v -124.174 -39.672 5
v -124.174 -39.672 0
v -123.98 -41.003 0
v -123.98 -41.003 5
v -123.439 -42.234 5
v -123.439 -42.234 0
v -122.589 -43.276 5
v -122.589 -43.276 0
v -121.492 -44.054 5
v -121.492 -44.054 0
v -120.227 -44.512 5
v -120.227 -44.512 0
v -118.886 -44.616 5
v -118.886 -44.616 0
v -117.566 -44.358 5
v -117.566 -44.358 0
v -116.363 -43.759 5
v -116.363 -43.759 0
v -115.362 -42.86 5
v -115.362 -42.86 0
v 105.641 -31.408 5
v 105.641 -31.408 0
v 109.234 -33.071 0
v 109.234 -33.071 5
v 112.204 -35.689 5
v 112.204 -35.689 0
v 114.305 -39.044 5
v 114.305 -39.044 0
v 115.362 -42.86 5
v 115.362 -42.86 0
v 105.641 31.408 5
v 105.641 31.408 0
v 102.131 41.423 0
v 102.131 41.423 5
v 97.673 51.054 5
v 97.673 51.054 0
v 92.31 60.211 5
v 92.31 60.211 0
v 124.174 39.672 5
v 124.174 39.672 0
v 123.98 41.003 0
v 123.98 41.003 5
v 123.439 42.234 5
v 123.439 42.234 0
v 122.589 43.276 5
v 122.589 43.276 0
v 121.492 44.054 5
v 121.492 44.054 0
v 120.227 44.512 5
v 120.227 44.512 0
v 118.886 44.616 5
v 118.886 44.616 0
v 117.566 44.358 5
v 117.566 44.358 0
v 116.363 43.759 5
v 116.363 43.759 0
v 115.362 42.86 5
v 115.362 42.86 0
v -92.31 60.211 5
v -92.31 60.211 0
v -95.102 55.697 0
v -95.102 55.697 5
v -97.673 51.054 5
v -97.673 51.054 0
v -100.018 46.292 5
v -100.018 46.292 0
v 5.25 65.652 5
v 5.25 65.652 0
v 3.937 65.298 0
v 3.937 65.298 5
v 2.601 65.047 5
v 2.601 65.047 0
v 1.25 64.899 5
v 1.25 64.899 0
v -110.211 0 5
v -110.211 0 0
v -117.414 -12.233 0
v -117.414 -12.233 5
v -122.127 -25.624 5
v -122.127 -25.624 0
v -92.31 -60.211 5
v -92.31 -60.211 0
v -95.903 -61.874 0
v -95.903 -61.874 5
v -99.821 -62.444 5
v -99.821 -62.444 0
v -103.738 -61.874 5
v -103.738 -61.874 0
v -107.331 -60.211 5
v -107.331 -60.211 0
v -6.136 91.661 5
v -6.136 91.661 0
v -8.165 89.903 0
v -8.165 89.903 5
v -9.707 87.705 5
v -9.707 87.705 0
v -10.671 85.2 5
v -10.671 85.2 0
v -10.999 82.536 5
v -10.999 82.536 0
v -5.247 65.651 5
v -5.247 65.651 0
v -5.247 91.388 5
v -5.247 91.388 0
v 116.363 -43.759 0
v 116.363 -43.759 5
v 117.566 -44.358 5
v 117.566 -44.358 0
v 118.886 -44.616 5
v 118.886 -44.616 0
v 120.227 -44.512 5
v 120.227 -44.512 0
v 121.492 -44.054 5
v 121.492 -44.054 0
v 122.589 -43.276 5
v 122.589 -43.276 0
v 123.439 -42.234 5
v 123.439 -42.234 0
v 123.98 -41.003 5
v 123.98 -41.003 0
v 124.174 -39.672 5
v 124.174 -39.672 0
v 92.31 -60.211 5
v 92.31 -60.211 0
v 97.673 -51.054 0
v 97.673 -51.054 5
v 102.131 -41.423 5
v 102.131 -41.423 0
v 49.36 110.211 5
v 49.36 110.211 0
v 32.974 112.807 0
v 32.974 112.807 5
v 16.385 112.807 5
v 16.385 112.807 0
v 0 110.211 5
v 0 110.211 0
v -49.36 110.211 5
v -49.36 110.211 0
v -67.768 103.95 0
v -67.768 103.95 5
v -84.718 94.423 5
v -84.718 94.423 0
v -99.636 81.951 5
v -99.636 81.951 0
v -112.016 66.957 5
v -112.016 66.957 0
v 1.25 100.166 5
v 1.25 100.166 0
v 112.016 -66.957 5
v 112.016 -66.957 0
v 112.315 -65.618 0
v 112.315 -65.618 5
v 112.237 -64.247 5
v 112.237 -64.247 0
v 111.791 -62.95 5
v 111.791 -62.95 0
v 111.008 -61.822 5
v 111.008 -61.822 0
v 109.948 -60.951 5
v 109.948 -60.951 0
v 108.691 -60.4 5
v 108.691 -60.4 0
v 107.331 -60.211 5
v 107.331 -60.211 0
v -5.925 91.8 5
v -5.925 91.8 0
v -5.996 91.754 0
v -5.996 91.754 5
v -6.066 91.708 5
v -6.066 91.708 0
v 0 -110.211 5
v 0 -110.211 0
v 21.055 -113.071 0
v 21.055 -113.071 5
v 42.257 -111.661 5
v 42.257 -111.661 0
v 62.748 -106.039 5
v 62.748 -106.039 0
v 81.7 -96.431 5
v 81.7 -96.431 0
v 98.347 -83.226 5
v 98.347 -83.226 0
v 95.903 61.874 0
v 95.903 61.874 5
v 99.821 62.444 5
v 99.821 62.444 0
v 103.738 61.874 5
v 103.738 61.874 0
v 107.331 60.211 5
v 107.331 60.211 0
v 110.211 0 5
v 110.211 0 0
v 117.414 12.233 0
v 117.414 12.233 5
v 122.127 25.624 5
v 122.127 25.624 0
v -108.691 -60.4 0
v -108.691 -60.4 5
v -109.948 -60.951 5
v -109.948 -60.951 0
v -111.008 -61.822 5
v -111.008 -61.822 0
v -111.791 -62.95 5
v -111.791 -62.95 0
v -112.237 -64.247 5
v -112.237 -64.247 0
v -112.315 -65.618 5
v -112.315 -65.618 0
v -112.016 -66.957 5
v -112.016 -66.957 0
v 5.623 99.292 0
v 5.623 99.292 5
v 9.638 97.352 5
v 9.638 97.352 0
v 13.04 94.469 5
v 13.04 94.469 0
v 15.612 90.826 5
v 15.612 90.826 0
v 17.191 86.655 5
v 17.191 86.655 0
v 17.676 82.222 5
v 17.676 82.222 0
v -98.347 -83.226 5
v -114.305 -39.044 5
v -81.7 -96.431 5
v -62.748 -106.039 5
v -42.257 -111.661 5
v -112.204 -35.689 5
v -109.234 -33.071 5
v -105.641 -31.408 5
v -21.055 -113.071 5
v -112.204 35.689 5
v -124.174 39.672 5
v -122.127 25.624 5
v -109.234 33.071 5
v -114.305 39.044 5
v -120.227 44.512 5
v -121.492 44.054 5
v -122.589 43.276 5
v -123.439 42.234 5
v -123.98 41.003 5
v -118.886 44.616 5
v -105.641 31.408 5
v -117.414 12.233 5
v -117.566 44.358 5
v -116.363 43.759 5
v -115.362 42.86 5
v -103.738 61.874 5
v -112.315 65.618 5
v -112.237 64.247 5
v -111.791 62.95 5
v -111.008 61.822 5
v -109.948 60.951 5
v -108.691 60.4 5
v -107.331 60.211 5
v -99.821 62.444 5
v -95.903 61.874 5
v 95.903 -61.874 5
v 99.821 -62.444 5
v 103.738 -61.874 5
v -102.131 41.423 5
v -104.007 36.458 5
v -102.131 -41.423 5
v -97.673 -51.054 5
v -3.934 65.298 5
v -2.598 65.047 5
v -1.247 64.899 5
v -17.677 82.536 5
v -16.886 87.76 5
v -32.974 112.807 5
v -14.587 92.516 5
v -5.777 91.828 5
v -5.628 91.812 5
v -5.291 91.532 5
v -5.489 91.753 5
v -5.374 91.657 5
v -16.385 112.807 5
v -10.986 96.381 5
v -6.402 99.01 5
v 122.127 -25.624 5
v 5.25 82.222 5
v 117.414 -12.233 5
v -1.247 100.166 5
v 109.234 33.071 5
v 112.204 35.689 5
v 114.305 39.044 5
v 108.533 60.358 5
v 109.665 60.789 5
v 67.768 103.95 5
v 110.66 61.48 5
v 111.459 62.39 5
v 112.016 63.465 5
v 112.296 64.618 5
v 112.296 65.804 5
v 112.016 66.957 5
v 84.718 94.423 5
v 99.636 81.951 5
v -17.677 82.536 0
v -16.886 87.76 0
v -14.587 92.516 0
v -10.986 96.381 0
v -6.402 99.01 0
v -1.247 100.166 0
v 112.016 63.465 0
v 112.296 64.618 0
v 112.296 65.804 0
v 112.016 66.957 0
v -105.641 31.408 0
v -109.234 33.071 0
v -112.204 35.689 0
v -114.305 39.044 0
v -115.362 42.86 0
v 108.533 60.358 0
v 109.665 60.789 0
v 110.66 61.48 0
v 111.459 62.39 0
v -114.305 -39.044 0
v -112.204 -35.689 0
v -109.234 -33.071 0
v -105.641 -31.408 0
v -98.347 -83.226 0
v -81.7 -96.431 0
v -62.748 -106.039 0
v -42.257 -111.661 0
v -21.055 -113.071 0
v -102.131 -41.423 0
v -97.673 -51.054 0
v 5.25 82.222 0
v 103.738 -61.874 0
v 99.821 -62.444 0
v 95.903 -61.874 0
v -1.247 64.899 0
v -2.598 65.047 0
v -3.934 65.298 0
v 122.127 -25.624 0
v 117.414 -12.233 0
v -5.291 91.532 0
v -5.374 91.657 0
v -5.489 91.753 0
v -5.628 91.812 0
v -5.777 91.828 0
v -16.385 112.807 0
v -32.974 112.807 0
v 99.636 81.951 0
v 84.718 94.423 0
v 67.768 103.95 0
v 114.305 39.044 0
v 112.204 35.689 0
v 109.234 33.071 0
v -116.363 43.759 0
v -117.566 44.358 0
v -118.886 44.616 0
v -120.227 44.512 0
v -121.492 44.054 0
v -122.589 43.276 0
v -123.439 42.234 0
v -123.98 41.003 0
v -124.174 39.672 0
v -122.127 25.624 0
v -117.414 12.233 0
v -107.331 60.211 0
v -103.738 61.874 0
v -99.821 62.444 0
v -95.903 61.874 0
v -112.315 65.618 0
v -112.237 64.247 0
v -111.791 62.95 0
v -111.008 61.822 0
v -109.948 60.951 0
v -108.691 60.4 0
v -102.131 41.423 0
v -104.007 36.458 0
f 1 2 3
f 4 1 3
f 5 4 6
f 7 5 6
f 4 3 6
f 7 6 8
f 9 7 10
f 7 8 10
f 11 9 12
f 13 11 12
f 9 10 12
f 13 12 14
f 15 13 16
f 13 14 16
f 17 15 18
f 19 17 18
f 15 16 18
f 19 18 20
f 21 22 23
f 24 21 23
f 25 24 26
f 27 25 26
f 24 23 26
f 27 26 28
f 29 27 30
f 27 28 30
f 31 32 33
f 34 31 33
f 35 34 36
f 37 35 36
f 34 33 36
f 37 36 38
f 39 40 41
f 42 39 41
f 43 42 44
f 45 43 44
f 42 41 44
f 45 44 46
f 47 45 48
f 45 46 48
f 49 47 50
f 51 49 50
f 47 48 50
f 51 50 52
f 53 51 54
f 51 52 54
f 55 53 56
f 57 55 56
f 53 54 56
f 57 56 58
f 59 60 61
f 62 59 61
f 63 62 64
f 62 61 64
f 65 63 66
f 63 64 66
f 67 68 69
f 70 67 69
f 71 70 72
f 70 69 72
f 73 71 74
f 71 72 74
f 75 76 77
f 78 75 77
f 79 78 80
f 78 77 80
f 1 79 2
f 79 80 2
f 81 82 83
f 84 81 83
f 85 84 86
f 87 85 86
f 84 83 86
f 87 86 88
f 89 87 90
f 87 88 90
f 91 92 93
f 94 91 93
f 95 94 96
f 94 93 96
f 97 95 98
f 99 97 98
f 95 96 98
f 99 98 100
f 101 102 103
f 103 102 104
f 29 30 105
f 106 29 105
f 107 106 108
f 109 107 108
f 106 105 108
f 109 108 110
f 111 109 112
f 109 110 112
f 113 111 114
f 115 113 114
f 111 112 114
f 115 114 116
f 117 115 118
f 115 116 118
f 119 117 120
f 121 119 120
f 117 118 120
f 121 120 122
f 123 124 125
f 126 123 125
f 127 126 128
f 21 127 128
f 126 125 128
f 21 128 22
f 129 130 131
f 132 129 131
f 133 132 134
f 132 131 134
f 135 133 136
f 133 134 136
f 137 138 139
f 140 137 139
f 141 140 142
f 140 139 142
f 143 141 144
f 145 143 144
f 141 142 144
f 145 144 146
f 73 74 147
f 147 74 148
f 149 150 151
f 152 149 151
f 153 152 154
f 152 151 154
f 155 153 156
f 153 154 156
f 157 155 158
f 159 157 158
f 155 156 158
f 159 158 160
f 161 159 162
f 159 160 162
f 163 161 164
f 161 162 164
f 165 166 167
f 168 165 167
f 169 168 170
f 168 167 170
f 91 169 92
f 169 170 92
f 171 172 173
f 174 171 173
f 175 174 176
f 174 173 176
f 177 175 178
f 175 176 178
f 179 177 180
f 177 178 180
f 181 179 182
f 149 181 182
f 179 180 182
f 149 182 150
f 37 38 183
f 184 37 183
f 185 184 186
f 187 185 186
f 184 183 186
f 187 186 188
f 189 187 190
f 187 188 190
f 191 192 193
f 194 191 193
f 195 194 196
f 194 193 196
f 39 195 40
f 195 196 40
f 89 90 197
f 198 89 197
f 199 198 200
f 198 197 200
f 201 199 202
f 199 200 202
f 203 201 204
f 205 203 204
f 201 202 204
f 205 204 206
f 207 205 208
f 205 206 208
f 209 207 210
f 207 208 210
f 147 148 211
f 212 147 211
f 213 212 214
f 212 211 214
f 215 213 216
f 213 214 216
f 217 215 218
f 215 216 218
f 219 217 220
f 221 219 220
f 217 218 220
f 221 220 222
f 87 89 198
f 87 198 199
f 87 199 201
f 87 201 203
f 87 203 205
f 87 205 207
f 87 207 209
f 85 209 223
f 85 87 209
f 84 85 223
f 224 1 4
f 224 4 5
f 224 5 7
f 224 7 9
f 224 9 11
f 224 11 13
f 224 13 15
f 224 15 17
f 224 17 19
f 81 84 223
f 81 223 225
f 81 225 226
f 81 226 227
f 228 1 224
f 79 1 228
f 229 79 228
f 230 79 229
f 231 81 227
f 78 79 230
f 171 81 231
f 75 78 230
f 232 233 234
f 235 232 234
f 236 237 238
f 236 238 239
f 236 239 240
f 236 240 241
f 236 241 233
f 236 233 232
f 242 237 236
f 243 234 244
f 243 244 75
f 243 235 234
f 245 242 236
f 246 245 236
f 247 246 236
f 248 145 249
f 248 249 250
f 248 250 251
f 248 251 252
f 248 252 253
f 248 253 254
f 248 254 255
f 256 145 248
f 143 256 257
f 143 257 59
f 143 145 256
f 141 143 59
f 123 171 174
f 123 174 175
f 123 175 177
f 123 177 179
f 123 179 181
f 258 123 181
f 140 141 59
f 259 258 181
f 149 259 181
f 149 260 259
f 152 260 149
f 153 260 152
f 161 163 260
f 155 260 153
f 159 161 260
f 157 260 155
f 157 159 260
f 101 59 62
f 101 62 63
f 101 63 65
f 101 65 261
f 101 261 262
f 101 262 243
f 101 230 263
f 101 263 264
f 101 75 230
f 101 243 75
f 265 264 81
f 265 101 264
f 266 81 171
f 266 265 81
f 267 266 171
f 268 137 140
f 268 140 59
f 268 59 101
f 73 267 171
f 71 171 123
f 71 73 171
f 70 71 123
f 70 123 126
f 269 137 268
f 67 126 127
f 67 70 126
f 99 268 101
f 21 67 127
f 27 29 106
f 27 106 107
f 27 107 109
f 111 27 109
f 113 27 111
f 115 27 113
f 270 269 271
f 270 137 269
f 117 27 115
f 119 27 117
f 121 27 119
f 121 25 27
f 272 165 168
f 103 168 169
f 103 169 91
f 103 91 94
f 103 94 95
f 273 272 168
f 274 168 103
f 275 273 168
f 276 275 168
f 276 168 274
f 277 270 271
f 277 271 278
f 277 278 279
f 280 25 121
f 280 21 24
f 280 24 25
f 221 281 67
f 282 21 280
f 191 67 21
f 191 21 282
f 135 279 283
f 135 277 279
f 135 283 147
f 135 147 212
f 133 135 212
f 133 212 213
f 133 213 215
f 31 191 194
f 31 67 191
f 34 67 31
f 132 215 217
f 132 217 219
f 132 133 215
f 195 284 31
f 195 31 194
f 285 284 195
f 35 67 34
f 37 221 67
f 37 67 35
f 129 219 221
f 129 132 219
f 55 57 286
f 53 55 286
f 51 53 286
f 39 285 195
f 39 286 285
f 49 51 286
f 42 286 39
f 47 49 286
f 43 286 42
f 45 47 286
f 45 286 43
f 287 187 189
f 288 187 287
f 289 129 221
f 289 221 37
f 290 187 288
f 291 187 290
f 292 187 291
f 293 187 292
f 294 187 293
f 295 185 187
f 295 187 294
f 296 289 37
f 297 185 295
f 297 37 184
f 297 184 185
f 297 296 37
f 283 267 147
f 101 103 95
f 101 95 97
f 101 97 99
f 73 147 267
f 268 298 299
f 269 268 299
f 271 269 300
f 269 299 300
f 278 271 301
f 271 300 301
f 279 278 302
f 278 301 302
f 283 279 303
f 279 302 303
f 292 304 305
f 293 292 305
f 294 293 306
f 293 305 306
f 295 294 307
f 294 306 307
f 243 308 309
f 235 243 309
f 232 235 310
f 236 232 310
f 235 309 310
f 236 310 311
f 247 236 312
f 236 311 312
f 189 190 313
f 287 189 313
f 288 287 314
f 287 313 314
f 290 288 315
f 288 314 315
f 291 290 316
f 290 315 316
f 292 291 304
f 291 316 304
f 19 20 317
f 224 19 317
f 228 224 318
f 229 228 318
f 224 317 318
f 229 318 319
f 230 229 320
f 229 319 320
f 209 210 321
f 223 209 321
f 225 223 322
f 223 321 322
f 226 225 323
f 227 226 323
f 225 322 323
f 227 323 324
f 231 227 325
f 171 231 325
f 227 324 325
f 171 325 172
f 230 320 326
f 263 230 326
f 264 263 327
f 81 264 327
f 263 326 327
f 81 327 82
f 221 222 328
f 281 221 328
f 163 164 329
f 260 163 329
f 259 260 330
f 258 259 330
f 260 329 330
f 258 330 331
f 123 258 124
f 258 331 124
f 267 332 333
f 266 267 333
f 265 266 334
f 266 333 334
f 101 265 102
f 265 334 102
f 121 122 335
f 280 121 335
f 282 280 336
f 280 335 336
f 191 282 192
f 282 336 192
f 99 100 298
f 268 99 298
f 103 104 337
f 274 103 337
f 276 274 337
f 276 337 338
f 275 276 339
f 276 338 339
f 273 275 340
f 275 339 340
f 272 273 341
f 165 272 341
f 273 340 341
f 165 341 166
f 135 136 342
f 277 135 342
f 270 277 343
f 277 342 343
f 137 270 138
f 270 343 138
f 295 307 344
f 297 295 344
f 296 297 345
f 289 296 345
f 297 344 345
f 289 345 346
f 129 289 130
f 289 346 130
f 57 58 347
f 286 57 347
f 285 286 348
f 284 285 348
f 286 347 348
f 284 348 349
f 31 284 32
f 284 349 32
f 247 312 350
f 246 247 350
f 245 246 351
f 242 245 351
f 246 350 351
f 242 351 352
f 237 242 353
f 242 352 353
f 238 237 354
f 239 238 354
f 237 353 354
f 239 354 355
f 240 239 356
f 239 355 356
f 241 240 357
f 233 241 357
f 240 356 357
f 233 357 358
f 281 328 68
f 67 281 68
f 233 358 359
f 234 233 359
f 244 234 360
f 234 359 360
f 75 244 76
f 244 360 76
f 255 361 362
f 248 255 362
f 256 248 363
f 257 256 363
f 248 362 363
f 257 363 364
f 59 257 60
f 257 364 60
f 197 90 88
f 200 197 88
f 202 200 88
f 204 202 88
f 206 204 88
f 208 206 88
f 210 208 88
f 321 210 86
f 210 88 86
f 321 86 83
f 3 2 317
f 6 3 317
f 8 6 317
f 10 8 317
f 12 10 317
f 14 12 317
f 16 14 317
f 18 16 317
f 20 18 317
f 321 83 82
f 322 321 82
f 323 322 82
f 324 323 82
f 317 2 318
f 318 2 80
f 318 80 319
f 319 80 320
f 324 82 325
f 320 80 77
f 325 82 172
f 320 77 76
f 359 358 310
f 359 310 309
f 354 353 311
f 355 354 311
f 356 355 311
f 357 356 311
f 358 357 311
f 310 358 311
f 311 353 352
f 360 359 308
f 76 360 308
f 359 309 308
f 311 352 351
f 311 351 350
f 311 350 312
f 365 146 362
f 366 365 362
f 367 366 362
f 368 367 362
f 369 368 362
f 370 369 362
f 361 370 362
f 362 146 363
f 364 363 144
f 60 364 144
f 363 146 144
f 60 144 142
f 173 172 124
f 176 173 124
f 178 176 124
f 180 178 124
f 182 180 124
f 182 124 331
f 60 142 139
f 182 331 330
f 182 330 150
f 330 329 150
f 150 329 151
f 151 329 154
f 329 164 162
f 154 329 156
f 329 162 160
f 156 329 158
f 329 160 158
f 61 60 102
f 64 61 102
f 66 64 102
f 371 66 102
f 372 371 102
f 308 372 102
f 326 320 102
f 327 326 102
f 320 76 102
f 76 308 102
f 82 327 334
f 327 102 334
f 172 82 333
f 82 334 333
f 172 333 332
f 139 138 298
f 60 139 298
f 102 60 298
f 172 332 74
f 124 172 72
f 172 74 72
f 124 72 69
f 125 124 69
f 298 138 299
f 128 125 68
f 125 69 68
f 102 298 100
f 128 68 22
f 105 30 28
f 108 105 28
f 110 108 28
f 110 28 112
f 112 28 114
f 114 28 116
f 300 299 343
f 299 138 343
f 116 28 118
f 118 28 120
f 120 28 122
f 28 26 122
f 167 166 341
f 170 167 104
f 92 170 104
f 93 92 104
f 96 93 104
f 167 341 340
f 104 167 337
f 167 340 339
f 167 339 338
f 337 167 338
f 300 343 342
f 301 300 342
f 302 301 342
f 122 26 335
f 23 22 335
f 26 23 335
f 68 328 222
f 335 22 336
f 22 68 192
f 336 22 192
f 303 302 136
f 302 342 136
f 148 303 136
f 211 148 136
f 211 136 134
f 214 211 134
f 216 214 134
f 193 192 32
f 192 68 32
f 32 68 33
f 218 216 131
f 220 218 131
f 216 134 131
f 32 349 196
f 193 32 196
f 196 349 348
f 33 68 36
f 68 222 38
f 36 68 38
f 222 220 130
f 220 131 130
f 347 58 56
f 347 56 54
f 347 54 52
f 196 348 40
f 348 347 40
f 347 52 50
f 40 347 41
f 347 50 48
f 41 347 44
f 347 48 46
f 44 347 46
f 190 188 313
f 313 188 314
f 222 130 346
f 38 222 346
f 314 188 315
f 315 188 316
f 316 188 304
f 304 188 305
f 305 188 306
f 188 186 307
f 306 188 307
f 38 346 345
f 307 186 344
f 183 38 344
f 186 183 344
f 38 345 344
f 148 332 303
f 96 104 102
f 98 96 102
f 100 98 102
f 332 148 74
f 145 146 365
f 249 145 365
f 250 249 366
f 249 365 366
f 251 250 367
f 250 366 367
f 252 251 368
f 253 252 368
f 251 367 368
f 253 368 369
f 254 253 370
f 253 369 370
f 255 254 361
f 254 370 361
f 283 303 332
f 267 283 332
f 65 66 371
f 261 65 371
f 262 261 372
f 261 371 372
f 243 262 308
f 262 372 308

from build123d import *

# Parameters (mm, degrees)
F1_DEPTH = 5


with BuildPart() as f1:
    # F0 (on Top) → F1 (new body)
    with BuildSketch(Plane.XY):
        with BuildLine():
            ThreePointArc((-49.3595098916, 110.2112788137), (-84.71847747, 94.422814407), (-112.0164757766, 66.9573545531))
            ThreePointArc((-112.0164757766, 66.9573545531), (-111.4379878132, 62.359119868), (-107.33126292, 60.2112788137))
            ThreePointArc((-107.33126292, 60.2112788137), (-99.8206092018, 62.444259798), (-92.3099554835, 60.2112788137))
            Line((-92.3099554835, 60.2112788137), (0, 0))
            Line((0, 0), (-110.2112788137, 0))
            ThreePointArc((-110.2112788137, 0), (-109.0627736394, -15.869385112), (-105.6411951245, -31.4080223893))
            ThreePointArc((-105.6411951245, -31.4080223893), (-100.0178554155, -46.292057373), (-92.3099554835, -60.2112788137))
            ThreePointArc((-92.3099554835, -60.2112788137), (-99.8206092018, -62.444259798), (-107.33126292, -60.2112788137))
            ThreePointArc((-107.33126292, -60.2112788137), (-111.4379878132, -62.359119868), (-112.0164757766, -66.9573545531))
            ThreePointArc((-112.0164757766, -66.9573545531), (-62.7481057699, -106.0388311627), (0, -110.2112788137))
            ThreePointArc((0, -110.2112788137), (62.7481057699, -106.0388311627), (112.0164757766, -66.9573545531))
            ThreePointArc((112.0164757766, -66.9573545531), (111.4379878132, -62.359119868), (107.33126292, -60.2112788137))
            ThreePointArc((107.33126292, -60.2112788137), (99.8206092018, -62.444259798), (92.3099554835, -60.2112788137))
            ThreePointArc((92.3099554835, -60.2112788137), (100.0178554155, -46.292057373), (105.6411951245, -31.4080223893))
            ThreePointArc((105.6411951245, -31.4080223893), (109.0627736394, -15.869385112), (110.2112788137, 0))
            ThreePointArc((110.2112788137, 0), (109.0627736394, 15.869385112), (105.6411951245, 31.4080223893))
            ThreePointArc((105.6411951245, 31.4080223893), (100.0178554155, 46.292057373), (92.3099554835, 60.2112788137))
            ThreePointArc((92.3099554835, 60.2112788137), (99.8206092018, 62.444259798), (107.33126292, 60.2112788137))
            ThreePointArc((107.33126292, 60.2112788137), (110.1834218657, 61.1045539205), (112.0164757766, 63.4652030743))
            Line((112.0164757766, 63.4652030743), (112.0164757766, 66.9573545531))
            ThreePointArc((112.0164757766, 66.9573545531), (84.71847747, 94.422814407), (49.3595098916, 110.2112788137))
            Line((49.3595098916, 110.2112788137), (0, 110.2112788137))
            Line((0, 110.2112788137), (-49.3595098916, 110.2112788137))
        make_face()
        with BuildLine():
            ThreePointArc((-17.676910541, 82.5358693145), (-12.9316790716, 94.5842825427), (-1.2471505461, 100.165794538))
            Line((-1.2471505461, 100.165794538), (-1.2471505461, 82.5358693145))
            Line((-1.2471505461, 82.5358693145), (-1.2471505461, 65.0322264722))
            Line((-1.2471505461, 65.0322264722), (-1.2471505461, 64.8986584064))
            ThreePointArc((-1.2471505461, 64.8986584064), (-3.2688897914, 65.1595640594), (-5.2471505461, 65.6514845023))
            Line((-5.2471505461, 65.6514845023), (-5.2471505461, 91.2374200697))
            Line((-5.2471505461, 91.2374200697), (-5.2471505461, 91.3882628083))
            ThreePointArc((-5.2471505461, 91.3882628083), (-5.4893133361, 91.7531337591), (-5.9247359984, 91.7998320749))
            ThreePointArc((-5.9247359984, 91.7998320749), (-6.030968486, 91.7310453203), (-6.1364025444, 91.6610409037))
            ThreePointArc((-6.1364025444, 91.6610409037), (-9.7068547443, 87.705450119), (-10.9992407835, 82.5358693145))
            Line((-10.9992407835, 82.5358693145), (-17.676910541, 82.5358693145))
        make_face(mode=Mode.SUBTRACT)
        with BuildLine():
            Line((17.6757126889, 82.222390346), (5.25, 82.222390346))
            Line((5.25, 82.222390346), (5.25, 65.6518987247))
            ThreePointArc((5.25, 65.6518987247), (3.2717488011, 65.1598166454), (1.25, 64.8987527373))
            Line((1.25, 64.8987527373), (1.25, 65.0322264722))
            Line((1.25, 65.0322264722), (1.25, 82.5322264722))
            Line((1.25, 82.5322264722), (1.25, 100.165700207))
            ThreePointArc((1.25, 100.165700207), (13.0400026737, 94.4686461336), (17.6757126889, 82.222390346))
        make_face(mode=Mode.SUBTRACT)
        with BuildLine():
            ThreePointArc((0, 110.2112788137), (-24.6797549458, 113.1333968343), (-49.3595098916, 110.2112788137))
            Line((-49.3595098916, 110.2112788137), (0, 110.2112788137))
        make_face()
        with BuildLine():
            Line((0, 0), (-92.3099554835, 60.2112788137))
            ThreePointArc((-92.3099554835, 60.2112788137), (-96.4154183349, 53.3909457218), (-100.0178554155, 46.292057373))
            Line((-100.0178554155, 46.292057373), (0, 0))
        make_face()
        with BuildLine():
            ThreePointArc((49.3595098916, 110.2112788137), (24.6797549458, 113.1333968343), (0, 110.2112788137))
            Line((0, 110.2112788137), (49.3595098916, 110.2112788137))
        make_face()
        with BuildLine():
            Line((0, 0), (-100.0178554155, 46.292057373))
            ThreePointArc((-100.0178554155, 46.292057373), (-103.09847182, 38.9516506215), (-105.6411951245, 31.4080223893))
            Line((-105.6411951245, 31.4080223893), (0, 0))
        make_face()
        with BuildLine():
            Line((-109.0627736443, 15.869385078), (0, 0))
            Line((0, 0), (-105.6411951245, 31.4080223893))
            ThreePointArc((-105.6411951245, 31.4080223893), (-107.6327592495, 23.7005298274), (-109.0627736443, 15.869385078))
        make_face()
        with BuildLine():
            Line((-110.2112788137, 0), (0, 0))
            Line((0, 0), (-109.0627736443, 15.869385078))
            ThreePointArc((-109.0627736443, 15.869385078), (-109.923777528, 7.955445413), (-110.2112788137, 0))
        make_face()
        with BuildLine():
            ThreePointArc((-109.0627736443, 15.869385078), (-107.6327592495, 23.7005298274), (-105.6411951245, 31.4080223893))
            ThreePointArc((-105.6411951245, 31.4080223893), (-112.2040526288, 35.6887962365), (-115.362225006, 42.8597146287))
            ThreePointArc((-115.362225006, 42.8597146287), (-120.874929791, 44.3257734811), (-124.1738093645, 39.6721043733))
            ThreePointArc((-124.1738093645, 39.6721043733), (-120.0946527482, 18.8146599148), (-110.2112788137, 0))
            ThreePointArc((-110.2112788137, 0), (-109.923777528, 7.955445413), (-109.0627736443, 15.869385078))
        make_face()
        with BuildLine():
            ThreePointArc((-105.6411951245, -31.4080223893), (-109.0627736394, -15.869385112), (-110.2112788137, 0))
            ThreePointArc((-110.2112788137, 0), (-120.0946527482, -18.8146599148), (-124.1738093645, -39.6721043733))
            ThreePointArc((-124.1738093645, -39.6721043733), (-120.874929791, -44.3257734811), (-115.362225006, -42.8597146287))
            ThreePointArc((-115.362225006, -42.8597146287), (-112.2040526288, -35.6887962365), (-105.6411951245, -31.4080223893))
        make_face()
        with BuildLine():
            ThreePointArc((112.0164757766, 63.4652030743), (112.33126292, 65.2112788137), (112.0164757766, 66.9573545531))
            Line((112.0164757766, 66.9573545531), (112.0164757766, 63.4652030743))
        make_face()
        with BuildLine():
            ThreePointArc((115.362225006, 42.8597146287), (112.2040526288, 35.6887962365), (105.6411951245, 31.4080223893))
            ThreePointArc((105.6411951245, 31.4080223893), (109.0627736394, 15.869385112), (110.2112788137, 0))
            ThreePointArc((110.2112788137, 0), (120.0946527482, 18.8146599148), (124.1738093645, 39.6721043733))
            ThreePointArc((124.1738093645, 39.6721043733), (120.874929791, 44.3257734811), (115.362225006, 42.8597146287))
        make_face()
        with BuildLine():
            ThreePointArc((124.1738093645, -39.6721043733), (120.0946527482, -18.8146599148), (110.2112788137, 0))
            ThreePointArc((110.2112788137, 0), (109.0627736394, -15.869385112), (105.6411951245, -31.4080223893))
            ThreePointArc((105.6411951245, -31.4080223893), (112.2040526288, -35.6887962365), (115.362225006, -42.8597146287))
            ThreePointArc((115.362225006, -42.8597146287), (120.874929791, -44.3257734811), (124.1738093645, -39.6721043733))
        make_face()
    extrude(amount=F1_DEPTH)


solid = f1.part
